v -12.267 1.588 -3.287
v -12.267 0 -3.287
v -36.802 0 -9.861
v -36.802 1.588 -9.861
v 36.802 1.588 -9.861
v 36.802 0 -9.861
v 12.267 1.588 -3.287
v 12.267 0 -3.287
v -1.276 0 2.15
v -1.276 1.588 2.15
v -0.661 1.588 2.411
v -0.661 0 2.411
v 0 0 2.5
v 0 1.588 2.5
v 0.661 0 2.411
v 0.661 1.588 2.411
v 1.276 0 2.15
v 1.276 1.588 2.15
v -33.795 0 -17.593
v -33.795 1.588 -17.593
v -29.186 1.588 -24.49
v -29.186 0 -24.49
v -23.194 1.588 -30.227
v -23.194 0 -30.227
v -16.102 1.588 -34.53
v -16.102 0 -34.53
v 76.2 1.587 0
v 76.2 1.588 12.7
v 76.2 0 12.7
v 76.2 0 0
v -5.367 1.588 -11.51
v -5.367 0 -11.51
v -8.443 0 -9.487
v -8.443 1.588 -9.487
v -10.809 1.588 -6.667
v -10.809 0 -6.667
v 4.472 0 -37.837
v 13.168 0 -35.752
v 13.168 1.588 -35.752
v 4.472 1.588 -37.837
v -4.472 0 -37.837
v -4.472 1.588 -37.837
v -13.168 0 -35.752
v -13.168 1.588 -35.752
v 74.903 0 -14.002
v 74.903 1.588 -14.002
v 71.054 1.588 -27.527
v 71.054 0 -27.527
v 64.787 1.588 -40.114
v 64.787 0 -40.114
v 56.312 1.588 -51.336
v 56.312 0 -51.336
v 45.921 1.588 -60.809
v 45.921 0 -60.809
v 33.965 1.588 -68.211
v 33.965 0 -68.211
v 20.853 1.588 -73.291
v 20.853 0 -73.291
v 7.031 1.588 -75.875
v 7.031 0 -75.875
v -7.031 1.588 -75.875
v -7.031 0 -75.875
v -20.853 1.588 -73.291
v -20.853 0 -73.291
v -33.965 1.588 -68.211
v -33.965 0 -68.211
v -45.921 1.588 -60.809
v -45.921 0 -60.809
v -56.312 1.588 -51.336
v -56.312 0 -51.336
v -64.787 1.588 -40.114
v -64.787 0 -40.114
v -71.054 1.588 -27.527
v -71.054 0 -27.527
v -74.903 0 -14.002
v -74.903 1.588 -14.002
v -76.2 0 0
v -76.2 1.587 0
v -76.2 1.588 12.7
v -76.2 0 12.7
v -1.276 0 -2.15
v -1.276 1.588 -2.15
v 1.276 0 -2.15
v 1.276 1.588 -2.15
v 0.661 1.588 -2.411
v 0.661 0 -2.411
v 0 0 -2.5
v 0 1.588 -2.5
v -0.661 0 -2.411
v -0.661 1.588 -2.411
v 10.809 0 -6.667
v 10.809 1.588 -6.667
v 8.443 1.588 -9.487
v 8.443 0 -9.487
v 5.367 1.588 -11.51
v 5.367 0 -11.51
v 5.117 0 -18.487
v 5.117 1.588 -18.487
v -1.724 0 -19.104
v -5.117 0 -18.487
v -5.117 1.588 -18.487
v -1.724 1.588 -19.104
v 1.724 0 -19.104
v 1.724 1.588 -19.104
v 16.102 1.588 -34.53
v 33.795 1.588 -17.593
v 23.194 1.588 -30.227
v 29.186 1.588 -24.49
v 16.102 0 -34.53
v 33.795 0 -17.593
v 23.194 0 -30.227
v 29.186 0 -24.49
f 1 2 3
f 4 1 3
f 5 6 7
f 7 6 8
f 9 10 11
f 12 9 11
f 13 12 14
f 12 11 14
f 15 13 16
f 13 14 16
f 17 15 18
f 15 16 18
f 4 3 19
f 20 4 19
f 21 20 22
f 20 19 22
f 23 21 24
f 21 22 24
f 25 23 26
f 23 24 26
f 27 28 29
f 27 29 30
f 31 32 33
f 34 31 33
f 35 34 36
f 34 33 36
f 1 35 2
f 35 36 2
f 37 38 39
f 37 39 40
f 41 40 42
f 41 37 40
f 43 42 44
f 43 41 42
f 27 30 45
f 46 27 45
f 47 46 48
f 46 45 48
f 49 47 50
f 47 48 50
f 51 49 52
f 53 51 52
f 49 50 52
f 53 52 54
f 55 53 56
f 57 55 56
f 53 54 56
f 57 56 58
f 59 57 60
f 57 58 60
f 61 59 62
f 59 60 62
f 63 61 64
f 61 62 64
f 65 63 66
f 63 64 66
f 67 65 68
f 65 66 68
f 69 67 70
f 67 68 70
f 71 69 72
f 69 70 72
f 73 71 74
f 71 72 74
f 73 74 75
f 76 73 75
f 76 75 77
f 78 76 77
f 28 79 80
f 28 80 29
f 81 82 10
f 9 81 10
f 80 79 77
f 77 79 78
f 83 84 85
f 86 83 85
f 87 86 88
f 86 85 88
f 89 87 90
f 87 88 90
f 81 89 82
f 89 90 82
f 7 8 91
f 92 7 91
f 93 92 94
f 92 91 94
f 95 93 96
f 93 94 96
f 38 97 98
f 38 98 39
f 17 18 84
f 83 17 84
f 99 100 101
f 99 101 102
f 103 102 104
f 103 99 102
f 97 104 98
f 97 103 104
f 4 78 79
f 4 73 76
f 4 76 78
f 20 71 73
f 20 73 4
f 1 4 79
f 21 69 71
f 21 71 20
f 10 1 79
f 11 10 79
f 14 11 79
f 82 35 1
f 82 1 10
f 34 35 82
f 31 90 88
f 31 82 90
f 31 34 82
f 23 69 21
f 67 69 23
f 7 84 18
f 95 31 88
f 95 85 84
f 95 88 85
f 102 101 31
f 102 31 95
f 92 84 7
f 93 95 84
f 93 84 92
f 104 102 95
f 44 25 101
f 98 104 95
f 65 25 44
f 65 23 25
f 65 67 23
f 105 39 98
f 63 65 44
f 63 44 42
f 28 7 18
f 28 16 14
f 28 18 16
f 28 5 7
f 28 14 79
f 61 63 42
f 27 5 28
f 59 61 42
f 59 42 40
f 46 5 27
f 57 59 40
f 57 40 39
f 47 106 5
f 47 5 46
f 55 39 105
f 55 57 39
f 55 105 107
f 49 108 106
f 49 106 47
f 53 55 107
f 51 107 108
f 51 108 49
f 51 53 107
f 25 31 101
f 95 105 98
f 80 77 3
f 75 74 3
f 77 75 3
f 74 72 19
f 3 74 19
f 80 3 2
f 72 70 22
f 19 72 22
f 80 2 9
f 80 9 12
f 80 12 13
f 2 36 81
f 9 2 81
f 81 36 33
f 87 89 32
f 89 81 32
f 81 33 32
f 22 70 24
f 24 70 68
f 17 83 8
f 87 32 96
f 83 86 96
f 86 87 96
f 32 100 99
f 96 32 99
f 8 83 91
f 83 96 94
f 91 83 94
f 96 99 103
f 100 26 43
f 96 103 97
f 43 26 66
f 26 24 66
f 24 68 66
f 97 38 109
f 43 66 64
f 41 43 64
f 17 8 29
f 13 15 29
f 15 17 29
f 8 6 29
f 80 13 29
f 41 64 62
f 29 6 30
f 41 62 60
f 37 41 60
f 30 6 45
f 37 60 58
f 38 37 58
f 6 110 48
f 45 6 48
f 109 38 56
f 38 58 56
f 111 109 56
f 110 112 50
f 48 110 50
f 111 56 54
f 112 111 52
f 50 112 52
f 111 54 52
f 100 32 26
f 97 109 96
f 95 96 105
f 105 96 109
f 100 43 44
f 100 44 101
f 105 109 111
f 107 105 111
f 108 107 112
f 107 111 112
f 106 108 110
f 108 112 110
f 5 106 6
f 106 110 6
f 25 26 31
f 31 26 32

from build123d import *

# Parameters (mm, degrees)
BOSS_EXTRUDE1_DEPTH = 1.5875
SKETCH3_W           = 152.4
SKETCH3_H           = 12.7
BOSS_EXTRUDE3_DEPTH = 1.5875
CUT_EXTRUDE1_DEPTH  = 2.5875


with BuildPart() as part:
    # Sketch1 → Boss-Extrude1 (new body)
    with BuildSketch(Plane(origin=(0, 0, 0), x_dir=(1, 0, 0), z_dir=(0, 1, 0))):
        with BuildLine():
            Line((-76.2, 0), (76.2, 0))
            ThreePointArc((76.2, 0), (0, 76.2), (-76.2, 0))
        make_face()
        with BuildLine():
            Line((-12.267257994, 3.287001873), (-36.801773982, 9.861005618))
            ThreePointArc((-36.801773982, 9.861005618), (-29.186293283, 24.490207929), (-16.101755772, 34.530326686))
            Line((-16.101755772, 34.530326686), (-5.367251924, 11.510108895))
            ThreePointArc((-5.367251924, 11.510108895), (-9.728764428, 8.163402643), (-12.267257994, 3.287001873))
        make_face(mode=Mode.SUBTRACT)
        with BuildLine():
            Line((36.801773982, 9.861005619), (12.267257994, 3.287001873))
            ThreePointArc((12.267257994, 3.287001873), (9.728764427, 8.163402643), (5.367251924, 11.510108895))
            Line((5.367251924, 11.510108895), (16.101755772, 34.530326686))
            ThreePointArc((16.101755772, 34.530326686), (29.186293283, 24.490207929), (36.801773982, 9.861005619))
        make_face(mode=Mode.SUBTRACT)
        with BuildLine():
            Line((-13.168222272, 35.752033819), (-5.117344386, 18.486870476))
            ThreePointArc((-5.117344386, 18.486870476), (0, 19.182064372), (5.117344386, 18.486870476))
            Line((5.117344386, 18.486870476), (13.168222272, 35.752033819))
            ThreePointArc((13.168222272, 35.752033819), (0, 38.1), (-13.168222272, 35.752033819))
        make_face(mode=Mode.SUBTRACT)
    extrude(amount=BOSS_EXTRUDE1_DEPTH)

    # Sketch3 → Boss-Extrude3 (add)
    with BuildSketch(Plane(origin=(0, 1.5875, 0), x_dir=(1, 0, 0), z_dir=(0, 1, 0))):
        with Locations((0, -6.35)):
            Rectangle(SKETCH3_W, SKETCH3_H)
    extrude(amount=-BOSS_EXTRUDE3_DEPTH)

    # Sketch4 → Cut-Extrude1 (cut, through all)
    with BuildSketch(Plane(origin=(0, 1.5875, 0), x_dir=(1, 0, 0), z_dir=(0, 1, 0))):
        with BuildLine():
            Line((-1.275735082, 2.15), (-1.275735082, -2.15))
            ThreePointArc((-1.275735082, -2.15), (0, -2.5), (1.275735082, -2.15))
            Line((1.275735082, -2.15), (1.275735082, 2.15))
            ThreePointArc((1.275735082, 2.15), (0, 2.5), (-1.275735082, 2.15))
        make_face()
    extrude(amount=-CUT_EXTRUDE1_DEPTH, mode=Mode.SUBTRACT)


solid = part.part
